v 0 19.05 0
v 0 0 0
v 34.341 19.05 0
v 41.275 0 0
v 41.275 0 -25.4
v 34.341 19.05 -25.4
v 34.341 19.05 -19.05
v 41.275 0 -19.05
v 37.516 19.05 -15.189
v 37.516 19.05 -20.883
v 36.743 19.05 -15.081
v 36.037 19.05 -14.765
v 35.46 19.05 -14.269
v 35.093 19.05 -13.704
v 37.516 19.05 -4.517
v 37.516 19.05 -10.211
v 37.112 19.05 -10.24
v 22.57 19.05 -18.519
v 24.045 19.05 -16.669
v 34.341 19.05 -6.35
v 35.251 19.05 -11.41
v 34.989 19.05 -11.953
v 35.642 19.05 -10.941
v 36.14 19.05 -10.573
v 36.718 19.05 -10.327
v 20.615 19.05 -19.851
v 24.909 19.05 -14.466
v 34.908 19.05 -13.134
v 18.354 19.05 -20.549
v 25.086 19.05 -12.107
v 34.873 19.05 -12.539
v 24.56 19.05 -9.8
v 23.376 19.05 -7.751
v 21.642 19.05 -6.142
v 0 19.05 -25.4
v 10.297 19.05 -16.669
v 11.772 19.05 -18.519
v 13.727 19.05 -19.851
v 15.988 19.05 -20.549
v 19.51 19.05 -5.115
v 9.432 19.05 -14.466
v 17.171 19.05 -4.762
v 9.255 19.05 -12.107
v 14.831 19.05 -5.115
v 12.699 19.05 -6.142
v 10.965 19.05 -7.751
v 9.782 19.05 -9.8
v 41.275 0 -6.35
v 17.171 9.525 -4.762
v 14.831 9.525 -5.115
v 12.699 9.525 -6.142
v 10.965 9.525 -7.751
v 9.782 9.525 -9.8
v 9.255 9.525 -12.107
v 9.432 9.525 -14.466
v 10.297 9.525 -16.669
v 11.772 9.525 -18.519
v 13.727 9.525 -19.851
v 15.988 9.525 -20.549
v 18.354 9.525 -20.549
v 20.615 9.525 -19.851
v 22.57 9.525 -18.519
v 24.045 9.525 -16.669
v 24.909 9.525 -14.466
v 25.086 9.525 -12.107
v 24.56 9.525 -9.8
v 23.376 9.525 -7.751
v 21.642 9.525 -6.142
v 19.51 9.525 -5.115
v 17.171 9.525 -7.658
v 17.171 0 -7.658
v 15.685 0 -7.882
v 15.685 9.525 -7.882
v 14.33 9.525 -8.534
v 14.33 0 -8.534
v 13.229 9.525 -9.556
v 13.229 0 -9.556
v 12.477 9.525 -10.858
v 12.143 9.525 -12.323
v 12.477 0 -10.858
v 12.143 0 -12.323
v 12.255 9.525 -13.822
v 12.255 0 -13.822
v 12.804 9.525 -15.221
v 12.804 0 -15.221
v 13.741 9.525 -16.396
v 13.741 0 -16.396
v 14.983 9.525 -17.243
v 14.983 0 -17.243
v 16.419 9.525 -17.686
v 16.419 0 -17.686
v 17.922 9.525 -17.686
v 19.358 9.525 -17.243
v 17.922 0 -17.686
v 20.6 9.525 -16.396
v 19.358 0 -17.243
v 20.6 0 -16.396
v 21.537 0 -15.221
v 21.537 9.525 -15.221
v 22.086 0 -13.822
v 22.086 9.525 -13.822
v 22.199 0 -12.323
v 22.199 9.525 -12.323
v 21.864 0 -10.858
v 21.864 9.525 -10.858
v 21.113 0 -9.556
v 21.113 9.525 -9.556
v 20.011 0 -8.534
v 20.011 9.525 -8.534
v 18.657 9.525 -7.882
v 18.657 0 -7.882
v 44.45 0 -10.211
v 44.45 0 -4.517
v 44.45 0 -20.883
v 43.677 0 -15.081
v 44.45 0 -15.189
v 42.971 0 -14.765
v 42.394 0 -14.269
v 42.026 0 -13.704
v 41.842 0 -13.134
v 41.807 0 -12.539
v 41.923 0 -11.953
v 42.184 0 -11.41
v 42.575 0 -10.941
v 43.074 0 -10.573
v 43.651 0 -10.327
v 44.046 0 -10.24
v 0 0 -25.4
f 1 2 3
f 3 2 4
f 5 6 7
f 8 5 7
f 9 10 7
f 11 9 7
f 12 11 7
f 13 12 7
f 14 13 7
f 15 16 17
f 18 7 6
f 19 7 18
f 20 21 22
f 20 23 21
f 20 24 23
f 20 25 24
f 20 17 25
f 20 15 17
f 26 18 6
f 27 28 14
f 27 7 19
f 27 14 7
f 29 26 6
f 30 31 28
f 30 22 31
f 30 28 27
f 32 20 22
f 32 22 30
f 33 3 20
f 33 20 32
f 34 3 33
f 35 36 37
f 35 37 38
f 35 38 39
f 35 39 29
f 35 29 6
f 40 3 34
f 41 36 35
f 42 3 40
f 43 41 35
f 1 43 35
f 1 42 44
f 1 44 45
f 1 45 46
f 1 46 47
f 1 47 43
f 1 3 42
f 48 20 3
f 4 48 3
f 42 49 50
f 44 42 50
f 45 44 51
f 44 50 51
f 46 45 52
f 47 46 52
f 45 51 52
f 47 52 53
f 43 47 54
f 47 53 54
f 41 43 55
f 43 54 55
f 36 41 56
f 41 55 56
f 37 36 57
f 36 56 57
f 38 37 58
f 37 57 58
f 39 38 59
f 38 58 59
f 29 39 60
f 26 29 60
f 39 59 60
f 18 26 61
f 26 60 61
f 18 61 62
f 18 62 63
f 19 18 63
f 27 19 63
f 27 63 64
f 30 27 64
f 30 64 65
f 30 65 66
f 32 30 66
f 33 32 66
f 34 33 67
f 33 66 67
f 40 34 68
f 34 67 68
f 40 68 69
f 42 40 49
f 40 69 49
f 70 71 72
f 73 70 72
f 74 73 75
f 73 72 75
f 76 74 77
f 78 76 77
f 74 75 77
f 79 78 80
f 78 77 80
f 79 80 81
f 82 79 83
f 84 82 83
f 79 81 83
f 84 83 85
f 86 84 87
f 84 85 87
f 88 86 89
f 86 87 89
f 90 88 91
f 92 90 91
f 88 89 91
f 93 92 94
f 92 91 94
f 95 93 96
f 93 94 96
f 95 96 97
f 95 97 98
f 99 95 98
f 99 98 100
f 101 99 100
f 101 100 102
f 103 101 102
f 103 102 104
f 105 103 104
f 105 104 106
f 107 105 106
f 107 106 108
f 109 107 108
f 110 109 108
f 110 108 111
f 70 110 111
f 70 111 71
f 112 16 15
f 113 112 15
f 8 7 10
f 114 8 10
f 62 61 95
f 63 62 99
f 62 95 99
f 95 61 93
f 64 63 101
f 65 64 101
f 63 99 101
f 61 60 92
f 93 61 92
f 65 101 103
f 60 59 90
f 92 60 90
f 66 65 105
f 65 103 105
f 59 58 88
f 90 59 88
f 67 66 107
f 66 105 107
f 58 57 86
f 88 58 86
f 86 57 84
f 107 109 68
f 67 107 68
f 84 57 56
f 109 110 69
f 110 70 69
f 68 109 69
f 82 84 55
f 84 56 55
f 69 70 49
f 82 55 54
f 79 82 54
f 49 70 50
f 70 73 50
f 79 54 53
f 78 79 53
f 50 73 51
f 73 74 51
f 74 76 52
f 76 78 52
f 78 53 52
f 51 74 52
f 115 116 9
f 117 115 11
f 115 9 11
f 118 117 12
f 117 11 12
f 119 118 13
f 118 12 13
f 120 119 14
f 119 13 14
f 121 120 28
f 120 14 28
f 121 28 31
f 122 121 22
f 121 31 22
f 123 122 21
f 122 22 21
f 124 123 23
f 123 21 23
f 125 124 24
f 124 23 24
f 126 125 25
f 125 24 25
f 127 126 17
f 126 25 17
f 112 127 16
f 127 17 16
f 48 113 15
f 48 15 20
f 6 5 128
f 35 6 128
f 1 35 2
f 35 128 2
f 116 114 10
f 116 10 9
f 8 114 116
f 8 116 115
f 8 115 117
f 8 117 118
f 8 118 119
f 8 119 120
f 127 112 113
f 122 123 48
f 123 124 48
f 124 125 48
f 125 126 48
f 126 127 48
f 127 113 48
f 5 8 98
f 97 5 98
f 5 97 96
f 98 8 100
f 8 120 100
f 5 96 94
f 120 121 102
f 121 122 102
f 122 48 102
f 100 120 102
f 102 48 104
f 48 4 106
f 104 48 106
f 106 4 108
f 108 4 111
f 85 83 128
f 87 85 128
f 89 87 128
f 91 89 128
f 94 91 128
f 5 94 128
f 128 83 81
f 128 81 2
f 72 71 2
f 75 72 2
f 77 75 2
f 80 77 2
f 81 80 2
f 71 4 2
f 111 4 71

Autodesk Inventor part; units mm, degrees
ref_plane "YZ Plane" through (0, 0, 0) normal (1, 0, 0) x (0, 1, 0)
ref_plane "XZ Plane" through (0, 0, 0) normal (0, 1, 0) x (-1, 0, 0)
sketch "Sketch1" plane through (0, 0, 0) normal (0, 1, 0) x (-1, 0, 0)
  line L0 (0, 0) -> (-44.45, 0)
  line L1 (-44.45, 0) -> (-44.45, -25.4)
  line L2 (-44.45, -25.4) -> (0, -25.4)
  line L3 (0, -25.4) -> (0, 0)
  line L4 (-41.275, -25.4) -> (-41.275, 0)
  line L5 (-41.275, -19.05) -> (-44.45, -20.8831)
  line L6 (0, -12.7) -> (-44.45, -12.7) construction
  line L7 (-41.275, -6.35) -> (-44.45, -4.5169)
  point P0 (-44.45, -4.5169)
  point P1 (-41.275, -6.35)
  dimension "d0" = 44.45
  dimension "d7" = 25.4
  dimension "d10" = 3.175
  dimension "d11" = 12.7
  dimension "d12" = 60
extrude "Extrusion1" add sketch "Sketch1" along normal blind 19.05
sketch "Sketch3" plane through (0, 0, 0) normal (0, 0, 1) x (1, 0, 0)
  line L0 (0, 0) -> (44.45, 0) projected
  line L1 (44.45, 0) -> (44.45, 19.05) projected
  line L2 (0, 19.05) -> (44.45, 19.05) projected
  line L3 (0, 0) -> (0, 19.05) projected
  line L4 (24.8164, 19.05) -> (31.75, 0)
  dimension "d14" = 70
  dimension "d15" = 31.75
sweep "Sweep1" cut profiles "Sketch1" path "Sketch3" path curves L4 contours L4 L7 L1 L0 | L2 L1 L5 L4
ref_plane "Work Plane3" through (44.45, 0, 0) normal (-0.342, 0.9397, 0) x (0, 0, -1)
ref_plane "Work Plane2" through (44.45, 0, 0) normal (-0.9397, -0.342, 0) x (0, 0, -1)
sketch "Sketch5" plane through (44.45, 0, 0) normal (-0.342, 0.9397, 0) x (0, 0, -1)
  point P0 (12.7, 0)
hole "Hole2" at (44.45, 0, -12.7) direction (-0.342, 0.9397, 0) diameter 4.9784 end through all
split "Split1" plane through (44.45, 0, 0) removes the side toward (0.9397, 0.342, 0)
sketch "Sketch4" plane through (0, 19.05, 0) normal (0, 1, 0) x (1, 0, 0)
  line L0 (0, 0) -> (34.3414, 0) construction
  line L1 (0, 25.4) -> (0, 0) construction
  point P0 (17.1707, 12.7)
  point P1 (0, 12.7)
  point P2 (17.1707, 0)
hole "Hole1" at (17.1707, 19.05, -12.7) direction (0, -1, 0) diameter 10.0838 end through all counterbore diameter 15.875 counterbore depth 9.525
equation "\"d14\" = slopeAngle"
equation "\"d18\" = slopeAngle"
equation "\"slopeAngle\" = 70deg"
properties material "Steel, Alloy"
